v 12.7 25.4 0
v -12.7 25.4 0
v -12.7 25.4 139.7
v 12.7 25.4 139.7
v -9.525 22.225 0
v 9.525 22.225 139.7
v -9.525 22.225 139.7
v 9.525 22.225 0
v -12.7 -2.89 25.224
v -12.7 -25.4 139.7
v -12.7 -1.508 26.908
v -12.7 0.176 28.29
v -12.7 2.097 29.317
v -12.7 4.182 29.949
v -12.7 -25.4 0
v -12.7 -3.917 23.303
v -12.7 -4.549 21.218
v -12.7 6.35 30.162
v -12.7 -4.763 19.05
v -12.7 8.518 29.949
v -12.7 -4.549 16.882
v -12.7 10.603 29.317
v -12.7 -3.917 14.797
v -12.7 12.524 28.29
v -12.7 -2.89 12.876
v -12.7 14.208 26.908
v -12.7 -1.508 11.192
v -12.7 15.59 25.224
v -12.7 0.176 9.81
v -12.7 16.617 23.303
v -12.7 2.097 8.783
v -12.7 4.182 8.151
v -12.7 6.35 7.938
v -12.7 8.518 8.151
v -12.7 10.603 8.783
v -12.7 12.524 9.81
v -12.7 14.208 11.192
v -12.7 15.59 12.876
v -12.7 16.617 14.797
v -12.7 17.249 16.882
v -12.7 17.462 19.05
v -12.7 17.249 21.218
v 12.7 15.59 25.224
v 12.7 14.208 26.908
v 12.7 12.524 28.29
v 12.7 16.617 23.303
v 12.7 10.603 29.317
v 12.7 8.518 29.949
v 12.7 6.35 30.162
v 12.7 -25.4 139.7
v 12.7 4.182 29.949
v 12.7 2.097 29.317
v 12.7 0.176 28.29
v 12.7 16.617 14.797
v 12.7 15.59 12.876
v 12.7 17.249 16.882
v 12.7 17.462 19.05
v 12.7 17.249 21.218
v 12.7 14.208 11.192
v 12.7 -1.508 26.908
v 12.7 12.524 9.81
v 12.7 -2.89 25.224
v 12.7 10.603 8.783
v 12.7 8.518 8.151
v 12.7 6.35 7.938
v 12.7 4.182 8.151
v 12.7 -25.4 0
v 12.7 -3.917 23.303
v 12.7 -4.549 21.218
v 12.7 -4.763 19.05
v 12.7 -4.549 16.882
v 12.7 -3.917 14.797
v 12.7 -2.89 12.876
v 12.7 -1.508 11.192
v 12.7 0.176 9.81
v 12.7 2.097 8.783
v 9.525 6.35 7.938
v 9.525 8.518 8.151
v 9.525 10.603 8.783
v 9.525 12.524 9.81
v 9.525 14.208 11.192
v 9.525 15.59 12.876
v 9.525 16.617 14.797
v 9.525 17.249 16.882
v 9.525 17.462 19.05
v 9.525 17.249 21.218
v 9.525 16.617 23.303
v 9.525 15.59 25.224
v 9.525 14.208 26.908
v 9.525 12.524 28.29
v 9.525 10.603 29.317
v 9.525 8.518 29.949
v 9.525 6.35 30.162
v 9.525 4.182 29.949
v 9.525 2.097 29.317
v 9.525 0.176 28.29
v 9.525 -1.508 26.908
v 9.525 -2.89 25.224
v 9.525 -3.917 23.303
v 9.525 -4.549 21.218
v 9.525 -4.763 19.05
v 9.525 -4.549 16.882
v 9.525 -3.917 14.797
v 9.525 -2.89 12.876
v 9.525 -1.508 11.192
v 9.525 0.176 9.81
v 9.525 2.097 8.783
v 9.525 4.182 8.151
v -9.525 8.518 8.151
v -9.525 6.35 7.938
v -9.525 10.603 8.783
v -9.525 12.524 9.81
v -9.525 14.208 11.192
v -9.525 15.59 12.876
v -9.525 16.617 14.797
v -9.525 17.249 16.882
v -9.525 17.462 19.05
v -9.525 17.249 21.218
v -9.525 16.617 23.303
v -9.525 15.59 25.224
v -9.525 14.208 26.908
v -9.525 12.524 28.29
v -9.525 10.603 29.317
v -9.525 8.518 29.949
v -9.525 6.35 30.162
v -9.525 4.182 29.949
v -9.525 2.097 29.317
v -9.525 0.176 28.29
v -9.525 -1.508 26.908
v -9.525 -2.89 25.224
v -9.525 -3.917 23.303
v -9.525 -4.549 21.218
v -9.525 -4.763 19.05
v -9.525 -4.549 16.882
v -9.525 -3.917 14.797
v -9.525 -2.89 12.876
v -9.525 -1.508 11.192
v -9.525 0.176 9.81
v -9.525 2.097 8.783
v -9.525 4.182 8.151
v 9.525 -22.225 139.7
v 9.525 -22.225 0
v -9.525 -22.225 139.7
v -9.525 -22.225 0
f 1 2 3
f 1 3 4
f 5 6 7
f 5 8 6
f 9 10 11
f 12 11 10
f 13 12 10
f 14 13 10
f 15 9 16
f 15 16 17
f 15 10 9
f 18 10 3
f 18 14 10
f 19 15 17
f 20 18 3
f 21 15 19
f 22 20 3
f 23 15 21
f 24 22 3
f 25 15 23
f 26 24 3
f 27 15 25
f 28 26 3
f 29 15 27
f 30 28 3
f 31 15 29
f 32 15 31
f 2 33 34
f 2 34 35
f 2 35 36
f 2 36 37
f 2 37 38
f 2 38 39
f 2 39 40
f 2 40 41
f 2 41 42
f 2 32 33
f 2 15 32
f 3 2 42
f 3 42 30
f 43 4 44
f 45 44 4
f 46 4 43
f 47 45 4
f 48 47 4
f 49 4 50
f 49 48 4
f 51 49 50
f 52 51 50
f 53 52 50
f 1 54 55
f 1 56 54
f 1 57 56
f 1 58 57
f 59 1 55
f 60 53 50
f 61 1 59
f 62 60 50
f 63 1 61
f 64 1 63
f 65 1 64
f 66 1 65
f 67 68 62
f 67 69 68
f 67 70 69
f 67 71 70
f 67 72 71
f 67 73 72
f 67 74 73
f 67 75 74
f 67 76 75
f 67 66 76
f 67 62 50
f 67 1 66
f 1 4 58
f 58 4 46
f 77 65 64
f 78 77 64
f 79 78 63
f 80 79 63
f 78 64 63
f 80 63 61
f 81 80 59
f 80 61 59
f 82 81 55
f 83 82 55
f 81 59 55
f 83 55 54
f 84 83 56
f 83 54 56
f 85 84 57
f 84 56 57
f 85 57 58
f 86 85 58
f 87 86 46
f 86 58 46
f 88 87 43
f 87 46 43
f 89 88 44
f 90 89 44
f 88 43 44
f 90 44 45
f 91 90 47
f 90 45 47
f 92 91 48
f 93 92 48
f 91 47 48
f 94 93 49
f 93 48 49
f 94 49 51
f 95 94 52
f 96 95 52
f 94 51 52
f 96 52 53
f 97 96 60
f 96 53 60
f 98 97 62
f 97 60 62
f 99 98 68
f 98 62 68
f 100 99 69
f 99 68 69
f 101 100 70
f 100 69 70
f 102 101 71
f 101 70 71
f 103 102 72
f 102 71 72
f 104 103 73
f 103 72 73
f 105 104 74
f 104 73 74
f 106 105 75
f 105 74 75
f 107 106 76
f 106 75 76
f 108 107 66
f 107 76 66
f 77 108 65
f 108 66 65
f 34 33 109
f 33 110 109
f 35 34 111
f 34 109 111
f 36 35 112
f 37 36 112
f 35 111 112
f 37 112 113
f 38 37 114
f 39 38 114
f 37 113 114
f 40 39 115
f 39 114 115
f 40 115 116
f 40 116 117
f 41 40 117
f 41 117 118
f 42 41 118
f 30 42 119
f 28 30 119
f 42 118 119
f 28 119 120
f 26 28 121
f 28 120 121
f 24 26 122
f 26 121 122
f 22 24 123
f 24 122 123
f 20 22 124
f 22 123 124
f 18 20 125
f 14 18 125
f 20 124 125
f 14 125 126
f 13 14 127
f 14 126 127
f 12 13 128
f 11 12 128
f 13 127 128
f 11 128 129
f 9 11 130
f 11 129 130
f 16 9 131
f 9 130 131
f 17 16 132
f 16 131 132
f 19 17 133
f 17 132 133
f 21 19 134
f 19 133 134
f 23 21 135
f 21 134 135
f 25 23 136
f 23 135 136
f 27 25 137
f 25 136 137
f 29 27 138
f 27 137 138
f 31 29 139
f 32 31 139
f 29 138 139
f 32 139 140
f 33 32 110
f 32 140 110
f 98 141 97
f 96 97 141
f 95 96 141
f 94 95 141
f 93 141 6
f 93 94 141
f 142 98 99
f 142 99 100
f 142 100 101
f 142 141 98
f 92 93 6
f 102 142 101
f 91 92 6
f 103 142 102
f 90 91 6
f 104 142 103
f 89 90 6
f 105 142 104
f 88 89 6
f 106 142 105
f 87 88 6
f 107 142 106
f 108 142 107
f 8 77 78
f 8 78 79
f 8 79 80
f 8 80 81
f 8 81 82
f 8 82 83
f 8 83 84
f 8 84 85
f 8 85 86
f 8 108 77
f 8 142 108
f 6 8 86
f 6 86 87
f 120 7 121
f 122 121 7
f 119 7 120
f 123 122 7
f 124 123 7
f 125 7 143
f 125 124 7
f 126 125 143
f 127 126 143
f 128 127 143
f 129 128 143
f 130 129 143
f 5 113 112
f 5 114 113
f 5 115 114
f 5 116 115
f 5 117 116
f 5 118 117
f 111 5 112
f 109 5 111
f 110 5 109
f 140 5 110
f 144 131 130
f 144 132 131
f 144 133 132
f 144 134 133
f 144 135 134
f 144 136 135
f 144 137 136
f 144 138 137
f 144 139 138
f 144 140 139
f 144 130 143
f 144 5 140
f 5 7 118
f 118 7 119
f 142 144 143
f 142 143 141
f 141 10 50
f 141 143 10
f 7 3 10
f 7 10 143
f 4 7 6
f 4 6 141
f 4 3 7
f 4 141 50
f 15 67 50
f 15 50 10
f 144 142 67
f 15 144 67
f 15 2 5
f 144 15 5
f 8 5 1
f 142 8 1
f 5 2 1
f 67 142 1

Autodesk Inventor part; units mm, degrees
ref_plane "YZ Plane" through (0, 0, 0) normal (1, 0, 0) x (0, 1, 0)
ref_plane "XZ Plane" through (0, 0, 0) normal (0, 1, 0) x (-1, 0, 0)
ref_plane "XY Plane" through (0, 0, 0) normal (0, 0, 1) x (1, 0, 0)
sketch "Sketch1" plane through (0, 0, 0) normal (0, 0, 1) x (1, 0, 0)
  line L0 (-12.7, 25.4) -> (12.7, 25.4)
  line L1 (12.7, 25.4) -> (12.7, -25.4)
  line L2 (12.7, -25.4) -> (-12.7, -25.4)
  line L3 (-12.7, -25.4) -> (-12.7, 25.4)
  line L4 (-12.7, 25.4) -> (12.7, -25.4) construction
  line L5 (12.7, 25.4) -> (-12.7, -25.4) construction
  line L6 (-9.525, -22.225) -> (9.525, -22.225)
  line L7 (9.525, -22.225) -> (9.525, 22.225)
  line L8 (9.525, 22.225) -> (-9.525, 22.225)
  line L9 (-9.525, 22.225) -> (-9.525, -22.225)
  line L10 (-9.525, -22.225) -> (9.525, 22.225) construction
  line L11 (9.525, -22.225) -> (-9.525, 22.225) construction
  point P0 (0, 0)
  dimension "d0" = 50.8
  dimension "d1" = 25.4
  dimension "d2" = 3.175
  dimension "d3" = 3.175
extrude "Extrusion1" add sketch "Sketch1" along normal blind 139.7
sketch "Sketch2" plane through (12.7, -25.4, 0) normal (1, 0, 0) x (0, 0, -1)
  circle A0 centre (-19.05, 31.75) radius 11.1125
  line L0 (0, 50.8) -> (-139.7, 50.8) projected
  point P0 (0, 25.4)
  dimension "d6" = 22.225
  dimension "d7" = 19.05
  dimension "d8" = 19.05
extrude "Extrusion2" cut sketch "Sketch2" against normal through all
equation "\"d3\" = d2"
properties part number "pivot block" material "Aluminum 6061"
